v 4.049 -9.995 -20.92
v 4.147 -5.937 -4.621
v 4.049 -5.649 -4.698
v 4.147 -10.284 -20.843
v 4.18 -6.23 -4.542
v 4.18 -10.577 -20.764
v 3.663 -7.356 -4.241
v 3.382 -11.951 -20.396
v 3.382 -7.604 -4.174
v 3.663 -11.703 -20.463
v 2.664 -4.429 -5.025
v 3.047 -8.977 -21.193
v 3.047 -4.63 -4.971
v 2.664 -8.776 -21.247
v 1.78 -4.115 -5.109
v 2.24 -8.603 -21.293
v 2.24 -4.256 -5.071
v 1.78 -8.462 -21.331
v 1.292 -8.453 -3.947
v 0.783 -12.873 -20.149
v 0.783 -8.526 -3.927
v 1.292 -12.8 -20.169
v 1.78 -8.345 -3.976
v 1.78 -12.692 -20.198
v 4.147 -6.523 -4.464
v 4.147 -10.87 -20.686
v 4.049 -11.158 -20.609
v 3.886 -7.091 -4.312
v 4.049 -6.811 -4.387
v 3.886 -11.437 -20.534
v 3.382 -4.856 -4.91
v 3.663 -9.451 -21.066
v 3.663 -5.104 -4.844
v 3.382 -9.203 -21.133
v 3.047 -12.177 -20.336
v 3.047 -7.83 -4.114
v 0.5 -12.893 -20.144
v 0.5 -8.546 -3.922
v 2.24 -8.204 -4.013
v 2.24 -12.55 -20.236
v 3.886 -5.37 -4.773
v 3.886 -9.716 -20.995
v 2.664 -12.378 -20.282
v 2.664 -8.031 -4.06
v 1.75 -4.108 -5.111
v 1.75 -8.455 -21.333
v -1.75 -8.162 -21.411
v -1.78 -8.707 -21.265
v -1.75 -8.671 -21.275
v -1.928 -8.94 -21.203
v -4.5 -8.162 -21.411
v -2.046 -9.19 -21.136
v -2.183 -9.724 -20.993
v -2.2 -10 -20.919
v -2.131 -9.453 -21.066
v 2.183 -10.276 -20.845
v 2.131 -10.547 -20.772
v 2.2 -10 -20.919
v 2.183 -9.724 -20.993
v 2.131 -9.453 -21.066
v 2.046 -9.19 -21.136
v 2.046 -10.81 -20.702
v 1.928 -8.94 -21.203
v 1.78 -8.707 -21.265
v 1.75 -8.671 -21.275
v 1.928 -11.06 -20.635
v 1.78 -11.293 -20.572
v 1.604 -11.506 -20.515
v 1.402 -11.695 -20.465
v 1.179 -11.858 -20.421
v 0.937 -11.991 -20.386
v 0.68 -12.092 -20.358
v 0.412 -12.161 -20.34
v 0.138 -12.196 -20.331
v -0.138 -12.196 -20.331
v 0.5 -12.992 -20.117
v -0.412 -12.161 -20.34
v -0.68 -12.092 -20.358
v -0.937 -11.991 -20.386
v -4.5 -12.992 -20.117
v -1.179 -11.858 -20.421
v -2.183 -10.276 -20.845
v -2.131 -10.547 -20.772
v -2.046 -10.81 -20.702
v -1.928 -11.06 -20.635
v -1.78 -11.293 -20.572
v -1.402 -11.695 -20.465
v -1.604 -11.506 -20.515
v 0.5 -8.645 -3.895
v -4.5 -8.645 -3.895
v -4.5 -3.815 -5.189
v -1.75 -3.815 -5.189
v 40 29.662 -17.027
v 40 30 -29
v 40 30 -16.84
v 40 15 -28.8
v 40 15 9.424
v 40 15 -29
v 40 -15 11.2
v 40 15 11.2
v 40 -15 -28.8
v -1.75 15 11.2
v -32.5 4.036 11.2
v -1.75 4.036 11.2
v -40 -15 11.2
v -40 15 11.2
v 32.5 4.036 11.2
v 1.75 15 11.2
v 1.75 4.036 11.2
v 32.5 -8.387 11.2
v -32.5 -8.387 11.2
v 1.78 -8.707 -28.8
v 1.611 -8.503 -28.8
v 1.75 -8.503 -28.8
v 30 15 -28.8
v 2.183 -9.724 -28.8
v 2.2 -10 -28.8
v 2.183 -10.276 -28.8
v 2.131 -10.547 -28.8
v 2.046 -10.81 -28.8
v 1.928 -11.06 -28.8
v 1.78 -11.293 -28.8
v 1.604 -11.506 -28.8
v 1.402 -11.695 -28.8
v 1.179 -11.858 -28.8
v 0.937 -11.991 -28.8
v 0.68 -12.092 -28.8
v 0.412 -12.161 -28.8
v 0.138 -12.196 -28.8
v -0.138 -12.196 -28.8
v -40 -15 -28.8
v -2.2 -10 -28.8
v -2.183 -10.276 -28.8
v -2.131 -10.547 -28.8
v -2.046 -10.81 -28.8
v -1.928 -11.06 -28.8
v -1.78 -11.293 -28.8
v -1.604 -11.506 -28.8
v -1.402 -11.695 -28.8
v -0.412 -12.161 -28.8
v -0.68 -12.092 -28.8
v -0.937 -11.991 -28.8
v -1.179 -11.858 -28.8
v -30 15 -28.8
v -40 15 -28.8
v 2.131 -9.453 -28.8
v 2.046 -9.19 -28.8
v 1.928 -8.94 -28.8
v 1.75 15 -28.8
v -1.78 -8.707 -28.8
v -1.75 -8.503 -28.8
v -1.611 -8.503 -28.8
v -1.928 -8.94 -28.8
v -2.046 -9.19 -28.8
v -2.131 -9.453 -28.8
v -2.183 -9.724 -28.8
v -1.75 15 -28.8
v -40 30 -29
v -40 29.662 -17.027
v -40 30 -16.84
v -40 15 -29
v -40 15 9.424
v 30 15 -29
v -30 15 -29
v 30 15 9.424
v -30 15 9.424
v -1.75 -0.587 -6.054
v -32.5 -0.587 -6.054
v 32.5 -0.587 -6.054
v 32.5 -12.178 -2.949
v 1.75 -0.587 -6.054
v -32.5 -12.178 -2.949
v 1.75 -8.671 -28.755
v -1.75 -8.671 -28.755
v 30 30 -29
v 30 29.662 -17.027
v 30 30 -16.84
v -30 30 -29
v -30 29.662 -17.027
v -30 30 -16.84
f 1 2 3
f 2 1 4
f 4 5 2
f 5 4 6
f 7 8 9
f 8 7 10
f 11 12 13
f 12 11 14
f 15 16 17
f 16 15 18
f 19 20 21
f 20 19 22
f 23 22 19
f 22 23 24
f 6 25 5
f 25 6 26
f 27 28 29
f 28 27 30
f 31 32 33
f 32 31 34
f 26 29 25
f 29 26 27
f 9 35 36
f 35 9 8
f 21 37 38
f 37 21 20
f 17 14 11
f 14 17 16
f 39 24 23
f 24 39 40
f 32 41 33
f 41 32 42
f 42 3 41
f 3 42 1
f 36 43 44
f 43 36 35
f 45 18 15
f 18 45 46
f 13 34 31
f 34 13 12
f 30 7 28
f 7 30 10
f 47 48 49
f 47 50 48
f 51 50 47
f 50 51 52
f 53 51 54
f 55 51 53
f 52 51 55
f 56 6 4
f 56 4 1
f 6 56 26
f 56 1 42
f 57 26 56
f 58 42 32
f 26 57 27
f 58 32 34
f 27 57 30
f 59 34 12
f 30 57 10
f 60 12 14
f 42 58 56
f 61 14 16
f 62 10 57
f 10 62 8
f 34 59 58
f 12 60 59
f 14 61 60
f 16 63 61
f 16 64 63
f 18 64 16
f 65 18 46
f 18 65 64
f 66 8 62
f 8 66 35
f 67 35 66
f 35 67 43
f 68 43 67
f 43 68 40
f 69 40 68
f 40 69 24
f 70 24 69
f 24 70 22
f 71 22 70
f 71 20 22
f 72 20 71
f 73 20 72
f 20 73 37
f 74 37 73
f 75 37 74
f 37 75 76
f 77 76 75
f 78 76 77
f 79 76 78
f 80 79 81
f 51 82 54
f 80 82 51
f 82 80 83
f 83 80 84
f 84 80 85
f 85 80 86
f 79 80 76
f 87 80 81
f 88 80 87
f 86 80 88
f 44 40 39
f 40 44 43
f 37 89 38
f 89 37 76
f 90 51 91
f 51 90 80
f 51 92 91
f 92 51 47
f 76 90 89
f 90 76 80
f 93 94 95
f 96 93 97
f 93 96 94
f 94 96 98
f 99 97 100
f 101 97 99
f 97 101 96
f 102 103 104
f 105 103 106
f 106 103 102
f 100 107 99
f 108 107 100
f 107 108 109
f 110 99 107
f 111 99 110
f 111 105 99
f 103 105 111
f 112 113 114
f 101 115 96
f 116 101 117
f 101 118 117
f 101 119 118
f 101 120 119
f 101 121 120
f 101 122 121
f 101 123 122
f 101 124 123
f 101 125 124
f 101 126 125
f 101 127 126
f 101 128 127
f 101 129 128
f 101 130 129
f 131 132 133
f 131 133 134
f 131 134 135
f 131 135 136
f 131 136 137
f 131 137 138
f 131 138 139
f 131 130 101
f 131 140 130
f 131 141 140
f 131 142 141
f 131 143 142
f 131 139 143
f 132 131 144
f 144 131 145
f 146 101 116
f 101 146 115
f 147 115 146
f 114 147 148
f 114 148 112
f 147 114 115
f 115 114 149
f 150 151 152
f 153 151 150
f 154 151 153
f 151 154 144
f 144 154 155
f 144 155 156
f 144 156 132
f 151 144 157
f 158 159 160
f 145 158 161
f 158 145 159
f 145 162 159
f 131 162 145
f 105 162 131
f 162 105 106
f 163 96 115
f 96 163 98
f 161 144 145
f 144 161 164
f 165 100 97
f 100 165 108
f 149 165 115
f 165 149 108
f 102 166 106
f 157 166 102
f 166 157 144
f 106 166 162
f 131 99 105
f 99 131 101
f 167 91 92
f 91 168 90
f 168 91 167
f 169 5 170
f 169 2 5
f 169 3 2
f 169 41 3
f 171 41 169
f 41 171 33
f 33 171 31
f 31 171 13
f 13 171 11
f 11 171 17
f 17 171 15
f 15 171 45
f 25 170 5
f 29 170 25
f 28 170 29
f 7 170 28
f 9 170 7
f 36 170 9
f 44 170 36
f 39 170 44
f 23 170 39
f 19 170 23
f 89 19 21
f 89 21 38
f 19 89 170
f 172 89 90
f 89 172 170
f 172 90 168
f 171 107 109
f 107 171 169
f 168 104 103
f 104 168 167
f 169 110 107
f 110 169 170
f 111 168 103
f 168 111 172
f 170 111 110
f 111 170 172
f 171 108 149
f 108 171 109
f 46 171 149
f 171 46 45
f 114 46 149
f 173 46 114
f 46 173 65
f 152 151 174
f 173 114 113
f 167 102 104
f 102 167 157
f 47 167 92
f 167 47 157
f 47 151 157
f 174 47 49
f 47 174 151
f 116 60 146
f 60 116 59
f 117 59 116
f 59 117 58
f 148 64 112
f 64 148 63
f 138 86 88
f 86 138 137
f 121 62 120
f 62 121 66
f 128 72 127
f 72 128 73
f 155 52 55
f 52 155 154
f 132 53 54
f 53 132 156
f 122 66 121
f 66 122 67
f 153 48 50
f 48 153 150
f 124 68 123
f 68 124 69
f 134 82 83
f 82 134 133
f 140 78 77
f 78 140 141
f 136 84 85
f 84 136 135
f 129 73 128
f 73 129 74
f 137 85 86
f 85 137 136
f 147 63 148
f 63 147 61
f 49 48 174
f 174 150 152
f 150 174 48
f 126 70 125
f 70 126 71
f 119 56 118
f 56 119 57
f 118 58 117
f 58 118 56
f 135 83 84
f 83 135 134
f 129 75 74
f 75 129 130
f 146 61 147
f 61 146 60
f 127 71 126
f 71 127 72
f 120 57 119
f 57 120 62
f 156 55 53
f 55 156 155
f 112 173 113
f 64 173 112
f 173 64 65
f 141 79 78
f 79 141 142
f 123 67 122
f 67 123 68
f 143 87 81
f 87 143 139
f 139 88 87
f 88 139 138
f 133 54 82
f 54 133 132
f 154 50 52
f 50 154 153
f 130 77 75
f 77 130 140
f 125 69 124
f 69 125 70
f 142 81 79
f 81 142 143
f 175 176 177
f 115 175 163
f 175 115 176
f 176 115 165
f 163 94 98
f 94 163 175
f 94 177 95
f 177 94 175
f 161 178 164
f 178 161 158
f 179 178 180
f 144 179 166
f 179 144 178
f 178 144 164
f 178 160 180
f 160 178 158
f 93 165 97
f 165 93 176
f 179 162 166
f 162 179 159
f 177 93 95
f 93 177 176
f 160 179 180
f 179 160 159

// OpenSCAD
module connector(x,y,z, h){
	translate([x,y,z])
	
	union(){
	
	scale([1.9,1.1,1])  cylinder(h, r=2.2,$fn=50, center=true);
	color("red") translate([-2,0,0]) cube(size = [5,5,h], center = true);
	
	}
	
}
difference(){
	translate([0,0,-8.8]) cube(size = [80,30,40], center = true);
	rotate([-15,0,0])  translate([0,-5,5]) color("green") cube(size = [65,12,22], center = true);
	translate([0,12,-11]) rotate([-15,0,0]) cube(size = [3.5,35,45], center=true);
	translate([0,-10,-25]) color("red") cylinder(10, r=2.2,$fn=50, center=true);
	translate([0,4,-5]) rotate([-15,0,0]) connector(0,-10,-10, 18);
}


translate([0,1.5,-2.5]) rotate([0,0,180]) difference(){
	union(){
		translate([-35,-21,-6]) cube(size = [10,15,41], center = true);	
		translate([35,-21,-6]) cube(size = [10,15,41], center = true);
	}
	translate([0,-26,10]) rotate([61,0,0]) cube(size = [81,45,20], center = true);
}
